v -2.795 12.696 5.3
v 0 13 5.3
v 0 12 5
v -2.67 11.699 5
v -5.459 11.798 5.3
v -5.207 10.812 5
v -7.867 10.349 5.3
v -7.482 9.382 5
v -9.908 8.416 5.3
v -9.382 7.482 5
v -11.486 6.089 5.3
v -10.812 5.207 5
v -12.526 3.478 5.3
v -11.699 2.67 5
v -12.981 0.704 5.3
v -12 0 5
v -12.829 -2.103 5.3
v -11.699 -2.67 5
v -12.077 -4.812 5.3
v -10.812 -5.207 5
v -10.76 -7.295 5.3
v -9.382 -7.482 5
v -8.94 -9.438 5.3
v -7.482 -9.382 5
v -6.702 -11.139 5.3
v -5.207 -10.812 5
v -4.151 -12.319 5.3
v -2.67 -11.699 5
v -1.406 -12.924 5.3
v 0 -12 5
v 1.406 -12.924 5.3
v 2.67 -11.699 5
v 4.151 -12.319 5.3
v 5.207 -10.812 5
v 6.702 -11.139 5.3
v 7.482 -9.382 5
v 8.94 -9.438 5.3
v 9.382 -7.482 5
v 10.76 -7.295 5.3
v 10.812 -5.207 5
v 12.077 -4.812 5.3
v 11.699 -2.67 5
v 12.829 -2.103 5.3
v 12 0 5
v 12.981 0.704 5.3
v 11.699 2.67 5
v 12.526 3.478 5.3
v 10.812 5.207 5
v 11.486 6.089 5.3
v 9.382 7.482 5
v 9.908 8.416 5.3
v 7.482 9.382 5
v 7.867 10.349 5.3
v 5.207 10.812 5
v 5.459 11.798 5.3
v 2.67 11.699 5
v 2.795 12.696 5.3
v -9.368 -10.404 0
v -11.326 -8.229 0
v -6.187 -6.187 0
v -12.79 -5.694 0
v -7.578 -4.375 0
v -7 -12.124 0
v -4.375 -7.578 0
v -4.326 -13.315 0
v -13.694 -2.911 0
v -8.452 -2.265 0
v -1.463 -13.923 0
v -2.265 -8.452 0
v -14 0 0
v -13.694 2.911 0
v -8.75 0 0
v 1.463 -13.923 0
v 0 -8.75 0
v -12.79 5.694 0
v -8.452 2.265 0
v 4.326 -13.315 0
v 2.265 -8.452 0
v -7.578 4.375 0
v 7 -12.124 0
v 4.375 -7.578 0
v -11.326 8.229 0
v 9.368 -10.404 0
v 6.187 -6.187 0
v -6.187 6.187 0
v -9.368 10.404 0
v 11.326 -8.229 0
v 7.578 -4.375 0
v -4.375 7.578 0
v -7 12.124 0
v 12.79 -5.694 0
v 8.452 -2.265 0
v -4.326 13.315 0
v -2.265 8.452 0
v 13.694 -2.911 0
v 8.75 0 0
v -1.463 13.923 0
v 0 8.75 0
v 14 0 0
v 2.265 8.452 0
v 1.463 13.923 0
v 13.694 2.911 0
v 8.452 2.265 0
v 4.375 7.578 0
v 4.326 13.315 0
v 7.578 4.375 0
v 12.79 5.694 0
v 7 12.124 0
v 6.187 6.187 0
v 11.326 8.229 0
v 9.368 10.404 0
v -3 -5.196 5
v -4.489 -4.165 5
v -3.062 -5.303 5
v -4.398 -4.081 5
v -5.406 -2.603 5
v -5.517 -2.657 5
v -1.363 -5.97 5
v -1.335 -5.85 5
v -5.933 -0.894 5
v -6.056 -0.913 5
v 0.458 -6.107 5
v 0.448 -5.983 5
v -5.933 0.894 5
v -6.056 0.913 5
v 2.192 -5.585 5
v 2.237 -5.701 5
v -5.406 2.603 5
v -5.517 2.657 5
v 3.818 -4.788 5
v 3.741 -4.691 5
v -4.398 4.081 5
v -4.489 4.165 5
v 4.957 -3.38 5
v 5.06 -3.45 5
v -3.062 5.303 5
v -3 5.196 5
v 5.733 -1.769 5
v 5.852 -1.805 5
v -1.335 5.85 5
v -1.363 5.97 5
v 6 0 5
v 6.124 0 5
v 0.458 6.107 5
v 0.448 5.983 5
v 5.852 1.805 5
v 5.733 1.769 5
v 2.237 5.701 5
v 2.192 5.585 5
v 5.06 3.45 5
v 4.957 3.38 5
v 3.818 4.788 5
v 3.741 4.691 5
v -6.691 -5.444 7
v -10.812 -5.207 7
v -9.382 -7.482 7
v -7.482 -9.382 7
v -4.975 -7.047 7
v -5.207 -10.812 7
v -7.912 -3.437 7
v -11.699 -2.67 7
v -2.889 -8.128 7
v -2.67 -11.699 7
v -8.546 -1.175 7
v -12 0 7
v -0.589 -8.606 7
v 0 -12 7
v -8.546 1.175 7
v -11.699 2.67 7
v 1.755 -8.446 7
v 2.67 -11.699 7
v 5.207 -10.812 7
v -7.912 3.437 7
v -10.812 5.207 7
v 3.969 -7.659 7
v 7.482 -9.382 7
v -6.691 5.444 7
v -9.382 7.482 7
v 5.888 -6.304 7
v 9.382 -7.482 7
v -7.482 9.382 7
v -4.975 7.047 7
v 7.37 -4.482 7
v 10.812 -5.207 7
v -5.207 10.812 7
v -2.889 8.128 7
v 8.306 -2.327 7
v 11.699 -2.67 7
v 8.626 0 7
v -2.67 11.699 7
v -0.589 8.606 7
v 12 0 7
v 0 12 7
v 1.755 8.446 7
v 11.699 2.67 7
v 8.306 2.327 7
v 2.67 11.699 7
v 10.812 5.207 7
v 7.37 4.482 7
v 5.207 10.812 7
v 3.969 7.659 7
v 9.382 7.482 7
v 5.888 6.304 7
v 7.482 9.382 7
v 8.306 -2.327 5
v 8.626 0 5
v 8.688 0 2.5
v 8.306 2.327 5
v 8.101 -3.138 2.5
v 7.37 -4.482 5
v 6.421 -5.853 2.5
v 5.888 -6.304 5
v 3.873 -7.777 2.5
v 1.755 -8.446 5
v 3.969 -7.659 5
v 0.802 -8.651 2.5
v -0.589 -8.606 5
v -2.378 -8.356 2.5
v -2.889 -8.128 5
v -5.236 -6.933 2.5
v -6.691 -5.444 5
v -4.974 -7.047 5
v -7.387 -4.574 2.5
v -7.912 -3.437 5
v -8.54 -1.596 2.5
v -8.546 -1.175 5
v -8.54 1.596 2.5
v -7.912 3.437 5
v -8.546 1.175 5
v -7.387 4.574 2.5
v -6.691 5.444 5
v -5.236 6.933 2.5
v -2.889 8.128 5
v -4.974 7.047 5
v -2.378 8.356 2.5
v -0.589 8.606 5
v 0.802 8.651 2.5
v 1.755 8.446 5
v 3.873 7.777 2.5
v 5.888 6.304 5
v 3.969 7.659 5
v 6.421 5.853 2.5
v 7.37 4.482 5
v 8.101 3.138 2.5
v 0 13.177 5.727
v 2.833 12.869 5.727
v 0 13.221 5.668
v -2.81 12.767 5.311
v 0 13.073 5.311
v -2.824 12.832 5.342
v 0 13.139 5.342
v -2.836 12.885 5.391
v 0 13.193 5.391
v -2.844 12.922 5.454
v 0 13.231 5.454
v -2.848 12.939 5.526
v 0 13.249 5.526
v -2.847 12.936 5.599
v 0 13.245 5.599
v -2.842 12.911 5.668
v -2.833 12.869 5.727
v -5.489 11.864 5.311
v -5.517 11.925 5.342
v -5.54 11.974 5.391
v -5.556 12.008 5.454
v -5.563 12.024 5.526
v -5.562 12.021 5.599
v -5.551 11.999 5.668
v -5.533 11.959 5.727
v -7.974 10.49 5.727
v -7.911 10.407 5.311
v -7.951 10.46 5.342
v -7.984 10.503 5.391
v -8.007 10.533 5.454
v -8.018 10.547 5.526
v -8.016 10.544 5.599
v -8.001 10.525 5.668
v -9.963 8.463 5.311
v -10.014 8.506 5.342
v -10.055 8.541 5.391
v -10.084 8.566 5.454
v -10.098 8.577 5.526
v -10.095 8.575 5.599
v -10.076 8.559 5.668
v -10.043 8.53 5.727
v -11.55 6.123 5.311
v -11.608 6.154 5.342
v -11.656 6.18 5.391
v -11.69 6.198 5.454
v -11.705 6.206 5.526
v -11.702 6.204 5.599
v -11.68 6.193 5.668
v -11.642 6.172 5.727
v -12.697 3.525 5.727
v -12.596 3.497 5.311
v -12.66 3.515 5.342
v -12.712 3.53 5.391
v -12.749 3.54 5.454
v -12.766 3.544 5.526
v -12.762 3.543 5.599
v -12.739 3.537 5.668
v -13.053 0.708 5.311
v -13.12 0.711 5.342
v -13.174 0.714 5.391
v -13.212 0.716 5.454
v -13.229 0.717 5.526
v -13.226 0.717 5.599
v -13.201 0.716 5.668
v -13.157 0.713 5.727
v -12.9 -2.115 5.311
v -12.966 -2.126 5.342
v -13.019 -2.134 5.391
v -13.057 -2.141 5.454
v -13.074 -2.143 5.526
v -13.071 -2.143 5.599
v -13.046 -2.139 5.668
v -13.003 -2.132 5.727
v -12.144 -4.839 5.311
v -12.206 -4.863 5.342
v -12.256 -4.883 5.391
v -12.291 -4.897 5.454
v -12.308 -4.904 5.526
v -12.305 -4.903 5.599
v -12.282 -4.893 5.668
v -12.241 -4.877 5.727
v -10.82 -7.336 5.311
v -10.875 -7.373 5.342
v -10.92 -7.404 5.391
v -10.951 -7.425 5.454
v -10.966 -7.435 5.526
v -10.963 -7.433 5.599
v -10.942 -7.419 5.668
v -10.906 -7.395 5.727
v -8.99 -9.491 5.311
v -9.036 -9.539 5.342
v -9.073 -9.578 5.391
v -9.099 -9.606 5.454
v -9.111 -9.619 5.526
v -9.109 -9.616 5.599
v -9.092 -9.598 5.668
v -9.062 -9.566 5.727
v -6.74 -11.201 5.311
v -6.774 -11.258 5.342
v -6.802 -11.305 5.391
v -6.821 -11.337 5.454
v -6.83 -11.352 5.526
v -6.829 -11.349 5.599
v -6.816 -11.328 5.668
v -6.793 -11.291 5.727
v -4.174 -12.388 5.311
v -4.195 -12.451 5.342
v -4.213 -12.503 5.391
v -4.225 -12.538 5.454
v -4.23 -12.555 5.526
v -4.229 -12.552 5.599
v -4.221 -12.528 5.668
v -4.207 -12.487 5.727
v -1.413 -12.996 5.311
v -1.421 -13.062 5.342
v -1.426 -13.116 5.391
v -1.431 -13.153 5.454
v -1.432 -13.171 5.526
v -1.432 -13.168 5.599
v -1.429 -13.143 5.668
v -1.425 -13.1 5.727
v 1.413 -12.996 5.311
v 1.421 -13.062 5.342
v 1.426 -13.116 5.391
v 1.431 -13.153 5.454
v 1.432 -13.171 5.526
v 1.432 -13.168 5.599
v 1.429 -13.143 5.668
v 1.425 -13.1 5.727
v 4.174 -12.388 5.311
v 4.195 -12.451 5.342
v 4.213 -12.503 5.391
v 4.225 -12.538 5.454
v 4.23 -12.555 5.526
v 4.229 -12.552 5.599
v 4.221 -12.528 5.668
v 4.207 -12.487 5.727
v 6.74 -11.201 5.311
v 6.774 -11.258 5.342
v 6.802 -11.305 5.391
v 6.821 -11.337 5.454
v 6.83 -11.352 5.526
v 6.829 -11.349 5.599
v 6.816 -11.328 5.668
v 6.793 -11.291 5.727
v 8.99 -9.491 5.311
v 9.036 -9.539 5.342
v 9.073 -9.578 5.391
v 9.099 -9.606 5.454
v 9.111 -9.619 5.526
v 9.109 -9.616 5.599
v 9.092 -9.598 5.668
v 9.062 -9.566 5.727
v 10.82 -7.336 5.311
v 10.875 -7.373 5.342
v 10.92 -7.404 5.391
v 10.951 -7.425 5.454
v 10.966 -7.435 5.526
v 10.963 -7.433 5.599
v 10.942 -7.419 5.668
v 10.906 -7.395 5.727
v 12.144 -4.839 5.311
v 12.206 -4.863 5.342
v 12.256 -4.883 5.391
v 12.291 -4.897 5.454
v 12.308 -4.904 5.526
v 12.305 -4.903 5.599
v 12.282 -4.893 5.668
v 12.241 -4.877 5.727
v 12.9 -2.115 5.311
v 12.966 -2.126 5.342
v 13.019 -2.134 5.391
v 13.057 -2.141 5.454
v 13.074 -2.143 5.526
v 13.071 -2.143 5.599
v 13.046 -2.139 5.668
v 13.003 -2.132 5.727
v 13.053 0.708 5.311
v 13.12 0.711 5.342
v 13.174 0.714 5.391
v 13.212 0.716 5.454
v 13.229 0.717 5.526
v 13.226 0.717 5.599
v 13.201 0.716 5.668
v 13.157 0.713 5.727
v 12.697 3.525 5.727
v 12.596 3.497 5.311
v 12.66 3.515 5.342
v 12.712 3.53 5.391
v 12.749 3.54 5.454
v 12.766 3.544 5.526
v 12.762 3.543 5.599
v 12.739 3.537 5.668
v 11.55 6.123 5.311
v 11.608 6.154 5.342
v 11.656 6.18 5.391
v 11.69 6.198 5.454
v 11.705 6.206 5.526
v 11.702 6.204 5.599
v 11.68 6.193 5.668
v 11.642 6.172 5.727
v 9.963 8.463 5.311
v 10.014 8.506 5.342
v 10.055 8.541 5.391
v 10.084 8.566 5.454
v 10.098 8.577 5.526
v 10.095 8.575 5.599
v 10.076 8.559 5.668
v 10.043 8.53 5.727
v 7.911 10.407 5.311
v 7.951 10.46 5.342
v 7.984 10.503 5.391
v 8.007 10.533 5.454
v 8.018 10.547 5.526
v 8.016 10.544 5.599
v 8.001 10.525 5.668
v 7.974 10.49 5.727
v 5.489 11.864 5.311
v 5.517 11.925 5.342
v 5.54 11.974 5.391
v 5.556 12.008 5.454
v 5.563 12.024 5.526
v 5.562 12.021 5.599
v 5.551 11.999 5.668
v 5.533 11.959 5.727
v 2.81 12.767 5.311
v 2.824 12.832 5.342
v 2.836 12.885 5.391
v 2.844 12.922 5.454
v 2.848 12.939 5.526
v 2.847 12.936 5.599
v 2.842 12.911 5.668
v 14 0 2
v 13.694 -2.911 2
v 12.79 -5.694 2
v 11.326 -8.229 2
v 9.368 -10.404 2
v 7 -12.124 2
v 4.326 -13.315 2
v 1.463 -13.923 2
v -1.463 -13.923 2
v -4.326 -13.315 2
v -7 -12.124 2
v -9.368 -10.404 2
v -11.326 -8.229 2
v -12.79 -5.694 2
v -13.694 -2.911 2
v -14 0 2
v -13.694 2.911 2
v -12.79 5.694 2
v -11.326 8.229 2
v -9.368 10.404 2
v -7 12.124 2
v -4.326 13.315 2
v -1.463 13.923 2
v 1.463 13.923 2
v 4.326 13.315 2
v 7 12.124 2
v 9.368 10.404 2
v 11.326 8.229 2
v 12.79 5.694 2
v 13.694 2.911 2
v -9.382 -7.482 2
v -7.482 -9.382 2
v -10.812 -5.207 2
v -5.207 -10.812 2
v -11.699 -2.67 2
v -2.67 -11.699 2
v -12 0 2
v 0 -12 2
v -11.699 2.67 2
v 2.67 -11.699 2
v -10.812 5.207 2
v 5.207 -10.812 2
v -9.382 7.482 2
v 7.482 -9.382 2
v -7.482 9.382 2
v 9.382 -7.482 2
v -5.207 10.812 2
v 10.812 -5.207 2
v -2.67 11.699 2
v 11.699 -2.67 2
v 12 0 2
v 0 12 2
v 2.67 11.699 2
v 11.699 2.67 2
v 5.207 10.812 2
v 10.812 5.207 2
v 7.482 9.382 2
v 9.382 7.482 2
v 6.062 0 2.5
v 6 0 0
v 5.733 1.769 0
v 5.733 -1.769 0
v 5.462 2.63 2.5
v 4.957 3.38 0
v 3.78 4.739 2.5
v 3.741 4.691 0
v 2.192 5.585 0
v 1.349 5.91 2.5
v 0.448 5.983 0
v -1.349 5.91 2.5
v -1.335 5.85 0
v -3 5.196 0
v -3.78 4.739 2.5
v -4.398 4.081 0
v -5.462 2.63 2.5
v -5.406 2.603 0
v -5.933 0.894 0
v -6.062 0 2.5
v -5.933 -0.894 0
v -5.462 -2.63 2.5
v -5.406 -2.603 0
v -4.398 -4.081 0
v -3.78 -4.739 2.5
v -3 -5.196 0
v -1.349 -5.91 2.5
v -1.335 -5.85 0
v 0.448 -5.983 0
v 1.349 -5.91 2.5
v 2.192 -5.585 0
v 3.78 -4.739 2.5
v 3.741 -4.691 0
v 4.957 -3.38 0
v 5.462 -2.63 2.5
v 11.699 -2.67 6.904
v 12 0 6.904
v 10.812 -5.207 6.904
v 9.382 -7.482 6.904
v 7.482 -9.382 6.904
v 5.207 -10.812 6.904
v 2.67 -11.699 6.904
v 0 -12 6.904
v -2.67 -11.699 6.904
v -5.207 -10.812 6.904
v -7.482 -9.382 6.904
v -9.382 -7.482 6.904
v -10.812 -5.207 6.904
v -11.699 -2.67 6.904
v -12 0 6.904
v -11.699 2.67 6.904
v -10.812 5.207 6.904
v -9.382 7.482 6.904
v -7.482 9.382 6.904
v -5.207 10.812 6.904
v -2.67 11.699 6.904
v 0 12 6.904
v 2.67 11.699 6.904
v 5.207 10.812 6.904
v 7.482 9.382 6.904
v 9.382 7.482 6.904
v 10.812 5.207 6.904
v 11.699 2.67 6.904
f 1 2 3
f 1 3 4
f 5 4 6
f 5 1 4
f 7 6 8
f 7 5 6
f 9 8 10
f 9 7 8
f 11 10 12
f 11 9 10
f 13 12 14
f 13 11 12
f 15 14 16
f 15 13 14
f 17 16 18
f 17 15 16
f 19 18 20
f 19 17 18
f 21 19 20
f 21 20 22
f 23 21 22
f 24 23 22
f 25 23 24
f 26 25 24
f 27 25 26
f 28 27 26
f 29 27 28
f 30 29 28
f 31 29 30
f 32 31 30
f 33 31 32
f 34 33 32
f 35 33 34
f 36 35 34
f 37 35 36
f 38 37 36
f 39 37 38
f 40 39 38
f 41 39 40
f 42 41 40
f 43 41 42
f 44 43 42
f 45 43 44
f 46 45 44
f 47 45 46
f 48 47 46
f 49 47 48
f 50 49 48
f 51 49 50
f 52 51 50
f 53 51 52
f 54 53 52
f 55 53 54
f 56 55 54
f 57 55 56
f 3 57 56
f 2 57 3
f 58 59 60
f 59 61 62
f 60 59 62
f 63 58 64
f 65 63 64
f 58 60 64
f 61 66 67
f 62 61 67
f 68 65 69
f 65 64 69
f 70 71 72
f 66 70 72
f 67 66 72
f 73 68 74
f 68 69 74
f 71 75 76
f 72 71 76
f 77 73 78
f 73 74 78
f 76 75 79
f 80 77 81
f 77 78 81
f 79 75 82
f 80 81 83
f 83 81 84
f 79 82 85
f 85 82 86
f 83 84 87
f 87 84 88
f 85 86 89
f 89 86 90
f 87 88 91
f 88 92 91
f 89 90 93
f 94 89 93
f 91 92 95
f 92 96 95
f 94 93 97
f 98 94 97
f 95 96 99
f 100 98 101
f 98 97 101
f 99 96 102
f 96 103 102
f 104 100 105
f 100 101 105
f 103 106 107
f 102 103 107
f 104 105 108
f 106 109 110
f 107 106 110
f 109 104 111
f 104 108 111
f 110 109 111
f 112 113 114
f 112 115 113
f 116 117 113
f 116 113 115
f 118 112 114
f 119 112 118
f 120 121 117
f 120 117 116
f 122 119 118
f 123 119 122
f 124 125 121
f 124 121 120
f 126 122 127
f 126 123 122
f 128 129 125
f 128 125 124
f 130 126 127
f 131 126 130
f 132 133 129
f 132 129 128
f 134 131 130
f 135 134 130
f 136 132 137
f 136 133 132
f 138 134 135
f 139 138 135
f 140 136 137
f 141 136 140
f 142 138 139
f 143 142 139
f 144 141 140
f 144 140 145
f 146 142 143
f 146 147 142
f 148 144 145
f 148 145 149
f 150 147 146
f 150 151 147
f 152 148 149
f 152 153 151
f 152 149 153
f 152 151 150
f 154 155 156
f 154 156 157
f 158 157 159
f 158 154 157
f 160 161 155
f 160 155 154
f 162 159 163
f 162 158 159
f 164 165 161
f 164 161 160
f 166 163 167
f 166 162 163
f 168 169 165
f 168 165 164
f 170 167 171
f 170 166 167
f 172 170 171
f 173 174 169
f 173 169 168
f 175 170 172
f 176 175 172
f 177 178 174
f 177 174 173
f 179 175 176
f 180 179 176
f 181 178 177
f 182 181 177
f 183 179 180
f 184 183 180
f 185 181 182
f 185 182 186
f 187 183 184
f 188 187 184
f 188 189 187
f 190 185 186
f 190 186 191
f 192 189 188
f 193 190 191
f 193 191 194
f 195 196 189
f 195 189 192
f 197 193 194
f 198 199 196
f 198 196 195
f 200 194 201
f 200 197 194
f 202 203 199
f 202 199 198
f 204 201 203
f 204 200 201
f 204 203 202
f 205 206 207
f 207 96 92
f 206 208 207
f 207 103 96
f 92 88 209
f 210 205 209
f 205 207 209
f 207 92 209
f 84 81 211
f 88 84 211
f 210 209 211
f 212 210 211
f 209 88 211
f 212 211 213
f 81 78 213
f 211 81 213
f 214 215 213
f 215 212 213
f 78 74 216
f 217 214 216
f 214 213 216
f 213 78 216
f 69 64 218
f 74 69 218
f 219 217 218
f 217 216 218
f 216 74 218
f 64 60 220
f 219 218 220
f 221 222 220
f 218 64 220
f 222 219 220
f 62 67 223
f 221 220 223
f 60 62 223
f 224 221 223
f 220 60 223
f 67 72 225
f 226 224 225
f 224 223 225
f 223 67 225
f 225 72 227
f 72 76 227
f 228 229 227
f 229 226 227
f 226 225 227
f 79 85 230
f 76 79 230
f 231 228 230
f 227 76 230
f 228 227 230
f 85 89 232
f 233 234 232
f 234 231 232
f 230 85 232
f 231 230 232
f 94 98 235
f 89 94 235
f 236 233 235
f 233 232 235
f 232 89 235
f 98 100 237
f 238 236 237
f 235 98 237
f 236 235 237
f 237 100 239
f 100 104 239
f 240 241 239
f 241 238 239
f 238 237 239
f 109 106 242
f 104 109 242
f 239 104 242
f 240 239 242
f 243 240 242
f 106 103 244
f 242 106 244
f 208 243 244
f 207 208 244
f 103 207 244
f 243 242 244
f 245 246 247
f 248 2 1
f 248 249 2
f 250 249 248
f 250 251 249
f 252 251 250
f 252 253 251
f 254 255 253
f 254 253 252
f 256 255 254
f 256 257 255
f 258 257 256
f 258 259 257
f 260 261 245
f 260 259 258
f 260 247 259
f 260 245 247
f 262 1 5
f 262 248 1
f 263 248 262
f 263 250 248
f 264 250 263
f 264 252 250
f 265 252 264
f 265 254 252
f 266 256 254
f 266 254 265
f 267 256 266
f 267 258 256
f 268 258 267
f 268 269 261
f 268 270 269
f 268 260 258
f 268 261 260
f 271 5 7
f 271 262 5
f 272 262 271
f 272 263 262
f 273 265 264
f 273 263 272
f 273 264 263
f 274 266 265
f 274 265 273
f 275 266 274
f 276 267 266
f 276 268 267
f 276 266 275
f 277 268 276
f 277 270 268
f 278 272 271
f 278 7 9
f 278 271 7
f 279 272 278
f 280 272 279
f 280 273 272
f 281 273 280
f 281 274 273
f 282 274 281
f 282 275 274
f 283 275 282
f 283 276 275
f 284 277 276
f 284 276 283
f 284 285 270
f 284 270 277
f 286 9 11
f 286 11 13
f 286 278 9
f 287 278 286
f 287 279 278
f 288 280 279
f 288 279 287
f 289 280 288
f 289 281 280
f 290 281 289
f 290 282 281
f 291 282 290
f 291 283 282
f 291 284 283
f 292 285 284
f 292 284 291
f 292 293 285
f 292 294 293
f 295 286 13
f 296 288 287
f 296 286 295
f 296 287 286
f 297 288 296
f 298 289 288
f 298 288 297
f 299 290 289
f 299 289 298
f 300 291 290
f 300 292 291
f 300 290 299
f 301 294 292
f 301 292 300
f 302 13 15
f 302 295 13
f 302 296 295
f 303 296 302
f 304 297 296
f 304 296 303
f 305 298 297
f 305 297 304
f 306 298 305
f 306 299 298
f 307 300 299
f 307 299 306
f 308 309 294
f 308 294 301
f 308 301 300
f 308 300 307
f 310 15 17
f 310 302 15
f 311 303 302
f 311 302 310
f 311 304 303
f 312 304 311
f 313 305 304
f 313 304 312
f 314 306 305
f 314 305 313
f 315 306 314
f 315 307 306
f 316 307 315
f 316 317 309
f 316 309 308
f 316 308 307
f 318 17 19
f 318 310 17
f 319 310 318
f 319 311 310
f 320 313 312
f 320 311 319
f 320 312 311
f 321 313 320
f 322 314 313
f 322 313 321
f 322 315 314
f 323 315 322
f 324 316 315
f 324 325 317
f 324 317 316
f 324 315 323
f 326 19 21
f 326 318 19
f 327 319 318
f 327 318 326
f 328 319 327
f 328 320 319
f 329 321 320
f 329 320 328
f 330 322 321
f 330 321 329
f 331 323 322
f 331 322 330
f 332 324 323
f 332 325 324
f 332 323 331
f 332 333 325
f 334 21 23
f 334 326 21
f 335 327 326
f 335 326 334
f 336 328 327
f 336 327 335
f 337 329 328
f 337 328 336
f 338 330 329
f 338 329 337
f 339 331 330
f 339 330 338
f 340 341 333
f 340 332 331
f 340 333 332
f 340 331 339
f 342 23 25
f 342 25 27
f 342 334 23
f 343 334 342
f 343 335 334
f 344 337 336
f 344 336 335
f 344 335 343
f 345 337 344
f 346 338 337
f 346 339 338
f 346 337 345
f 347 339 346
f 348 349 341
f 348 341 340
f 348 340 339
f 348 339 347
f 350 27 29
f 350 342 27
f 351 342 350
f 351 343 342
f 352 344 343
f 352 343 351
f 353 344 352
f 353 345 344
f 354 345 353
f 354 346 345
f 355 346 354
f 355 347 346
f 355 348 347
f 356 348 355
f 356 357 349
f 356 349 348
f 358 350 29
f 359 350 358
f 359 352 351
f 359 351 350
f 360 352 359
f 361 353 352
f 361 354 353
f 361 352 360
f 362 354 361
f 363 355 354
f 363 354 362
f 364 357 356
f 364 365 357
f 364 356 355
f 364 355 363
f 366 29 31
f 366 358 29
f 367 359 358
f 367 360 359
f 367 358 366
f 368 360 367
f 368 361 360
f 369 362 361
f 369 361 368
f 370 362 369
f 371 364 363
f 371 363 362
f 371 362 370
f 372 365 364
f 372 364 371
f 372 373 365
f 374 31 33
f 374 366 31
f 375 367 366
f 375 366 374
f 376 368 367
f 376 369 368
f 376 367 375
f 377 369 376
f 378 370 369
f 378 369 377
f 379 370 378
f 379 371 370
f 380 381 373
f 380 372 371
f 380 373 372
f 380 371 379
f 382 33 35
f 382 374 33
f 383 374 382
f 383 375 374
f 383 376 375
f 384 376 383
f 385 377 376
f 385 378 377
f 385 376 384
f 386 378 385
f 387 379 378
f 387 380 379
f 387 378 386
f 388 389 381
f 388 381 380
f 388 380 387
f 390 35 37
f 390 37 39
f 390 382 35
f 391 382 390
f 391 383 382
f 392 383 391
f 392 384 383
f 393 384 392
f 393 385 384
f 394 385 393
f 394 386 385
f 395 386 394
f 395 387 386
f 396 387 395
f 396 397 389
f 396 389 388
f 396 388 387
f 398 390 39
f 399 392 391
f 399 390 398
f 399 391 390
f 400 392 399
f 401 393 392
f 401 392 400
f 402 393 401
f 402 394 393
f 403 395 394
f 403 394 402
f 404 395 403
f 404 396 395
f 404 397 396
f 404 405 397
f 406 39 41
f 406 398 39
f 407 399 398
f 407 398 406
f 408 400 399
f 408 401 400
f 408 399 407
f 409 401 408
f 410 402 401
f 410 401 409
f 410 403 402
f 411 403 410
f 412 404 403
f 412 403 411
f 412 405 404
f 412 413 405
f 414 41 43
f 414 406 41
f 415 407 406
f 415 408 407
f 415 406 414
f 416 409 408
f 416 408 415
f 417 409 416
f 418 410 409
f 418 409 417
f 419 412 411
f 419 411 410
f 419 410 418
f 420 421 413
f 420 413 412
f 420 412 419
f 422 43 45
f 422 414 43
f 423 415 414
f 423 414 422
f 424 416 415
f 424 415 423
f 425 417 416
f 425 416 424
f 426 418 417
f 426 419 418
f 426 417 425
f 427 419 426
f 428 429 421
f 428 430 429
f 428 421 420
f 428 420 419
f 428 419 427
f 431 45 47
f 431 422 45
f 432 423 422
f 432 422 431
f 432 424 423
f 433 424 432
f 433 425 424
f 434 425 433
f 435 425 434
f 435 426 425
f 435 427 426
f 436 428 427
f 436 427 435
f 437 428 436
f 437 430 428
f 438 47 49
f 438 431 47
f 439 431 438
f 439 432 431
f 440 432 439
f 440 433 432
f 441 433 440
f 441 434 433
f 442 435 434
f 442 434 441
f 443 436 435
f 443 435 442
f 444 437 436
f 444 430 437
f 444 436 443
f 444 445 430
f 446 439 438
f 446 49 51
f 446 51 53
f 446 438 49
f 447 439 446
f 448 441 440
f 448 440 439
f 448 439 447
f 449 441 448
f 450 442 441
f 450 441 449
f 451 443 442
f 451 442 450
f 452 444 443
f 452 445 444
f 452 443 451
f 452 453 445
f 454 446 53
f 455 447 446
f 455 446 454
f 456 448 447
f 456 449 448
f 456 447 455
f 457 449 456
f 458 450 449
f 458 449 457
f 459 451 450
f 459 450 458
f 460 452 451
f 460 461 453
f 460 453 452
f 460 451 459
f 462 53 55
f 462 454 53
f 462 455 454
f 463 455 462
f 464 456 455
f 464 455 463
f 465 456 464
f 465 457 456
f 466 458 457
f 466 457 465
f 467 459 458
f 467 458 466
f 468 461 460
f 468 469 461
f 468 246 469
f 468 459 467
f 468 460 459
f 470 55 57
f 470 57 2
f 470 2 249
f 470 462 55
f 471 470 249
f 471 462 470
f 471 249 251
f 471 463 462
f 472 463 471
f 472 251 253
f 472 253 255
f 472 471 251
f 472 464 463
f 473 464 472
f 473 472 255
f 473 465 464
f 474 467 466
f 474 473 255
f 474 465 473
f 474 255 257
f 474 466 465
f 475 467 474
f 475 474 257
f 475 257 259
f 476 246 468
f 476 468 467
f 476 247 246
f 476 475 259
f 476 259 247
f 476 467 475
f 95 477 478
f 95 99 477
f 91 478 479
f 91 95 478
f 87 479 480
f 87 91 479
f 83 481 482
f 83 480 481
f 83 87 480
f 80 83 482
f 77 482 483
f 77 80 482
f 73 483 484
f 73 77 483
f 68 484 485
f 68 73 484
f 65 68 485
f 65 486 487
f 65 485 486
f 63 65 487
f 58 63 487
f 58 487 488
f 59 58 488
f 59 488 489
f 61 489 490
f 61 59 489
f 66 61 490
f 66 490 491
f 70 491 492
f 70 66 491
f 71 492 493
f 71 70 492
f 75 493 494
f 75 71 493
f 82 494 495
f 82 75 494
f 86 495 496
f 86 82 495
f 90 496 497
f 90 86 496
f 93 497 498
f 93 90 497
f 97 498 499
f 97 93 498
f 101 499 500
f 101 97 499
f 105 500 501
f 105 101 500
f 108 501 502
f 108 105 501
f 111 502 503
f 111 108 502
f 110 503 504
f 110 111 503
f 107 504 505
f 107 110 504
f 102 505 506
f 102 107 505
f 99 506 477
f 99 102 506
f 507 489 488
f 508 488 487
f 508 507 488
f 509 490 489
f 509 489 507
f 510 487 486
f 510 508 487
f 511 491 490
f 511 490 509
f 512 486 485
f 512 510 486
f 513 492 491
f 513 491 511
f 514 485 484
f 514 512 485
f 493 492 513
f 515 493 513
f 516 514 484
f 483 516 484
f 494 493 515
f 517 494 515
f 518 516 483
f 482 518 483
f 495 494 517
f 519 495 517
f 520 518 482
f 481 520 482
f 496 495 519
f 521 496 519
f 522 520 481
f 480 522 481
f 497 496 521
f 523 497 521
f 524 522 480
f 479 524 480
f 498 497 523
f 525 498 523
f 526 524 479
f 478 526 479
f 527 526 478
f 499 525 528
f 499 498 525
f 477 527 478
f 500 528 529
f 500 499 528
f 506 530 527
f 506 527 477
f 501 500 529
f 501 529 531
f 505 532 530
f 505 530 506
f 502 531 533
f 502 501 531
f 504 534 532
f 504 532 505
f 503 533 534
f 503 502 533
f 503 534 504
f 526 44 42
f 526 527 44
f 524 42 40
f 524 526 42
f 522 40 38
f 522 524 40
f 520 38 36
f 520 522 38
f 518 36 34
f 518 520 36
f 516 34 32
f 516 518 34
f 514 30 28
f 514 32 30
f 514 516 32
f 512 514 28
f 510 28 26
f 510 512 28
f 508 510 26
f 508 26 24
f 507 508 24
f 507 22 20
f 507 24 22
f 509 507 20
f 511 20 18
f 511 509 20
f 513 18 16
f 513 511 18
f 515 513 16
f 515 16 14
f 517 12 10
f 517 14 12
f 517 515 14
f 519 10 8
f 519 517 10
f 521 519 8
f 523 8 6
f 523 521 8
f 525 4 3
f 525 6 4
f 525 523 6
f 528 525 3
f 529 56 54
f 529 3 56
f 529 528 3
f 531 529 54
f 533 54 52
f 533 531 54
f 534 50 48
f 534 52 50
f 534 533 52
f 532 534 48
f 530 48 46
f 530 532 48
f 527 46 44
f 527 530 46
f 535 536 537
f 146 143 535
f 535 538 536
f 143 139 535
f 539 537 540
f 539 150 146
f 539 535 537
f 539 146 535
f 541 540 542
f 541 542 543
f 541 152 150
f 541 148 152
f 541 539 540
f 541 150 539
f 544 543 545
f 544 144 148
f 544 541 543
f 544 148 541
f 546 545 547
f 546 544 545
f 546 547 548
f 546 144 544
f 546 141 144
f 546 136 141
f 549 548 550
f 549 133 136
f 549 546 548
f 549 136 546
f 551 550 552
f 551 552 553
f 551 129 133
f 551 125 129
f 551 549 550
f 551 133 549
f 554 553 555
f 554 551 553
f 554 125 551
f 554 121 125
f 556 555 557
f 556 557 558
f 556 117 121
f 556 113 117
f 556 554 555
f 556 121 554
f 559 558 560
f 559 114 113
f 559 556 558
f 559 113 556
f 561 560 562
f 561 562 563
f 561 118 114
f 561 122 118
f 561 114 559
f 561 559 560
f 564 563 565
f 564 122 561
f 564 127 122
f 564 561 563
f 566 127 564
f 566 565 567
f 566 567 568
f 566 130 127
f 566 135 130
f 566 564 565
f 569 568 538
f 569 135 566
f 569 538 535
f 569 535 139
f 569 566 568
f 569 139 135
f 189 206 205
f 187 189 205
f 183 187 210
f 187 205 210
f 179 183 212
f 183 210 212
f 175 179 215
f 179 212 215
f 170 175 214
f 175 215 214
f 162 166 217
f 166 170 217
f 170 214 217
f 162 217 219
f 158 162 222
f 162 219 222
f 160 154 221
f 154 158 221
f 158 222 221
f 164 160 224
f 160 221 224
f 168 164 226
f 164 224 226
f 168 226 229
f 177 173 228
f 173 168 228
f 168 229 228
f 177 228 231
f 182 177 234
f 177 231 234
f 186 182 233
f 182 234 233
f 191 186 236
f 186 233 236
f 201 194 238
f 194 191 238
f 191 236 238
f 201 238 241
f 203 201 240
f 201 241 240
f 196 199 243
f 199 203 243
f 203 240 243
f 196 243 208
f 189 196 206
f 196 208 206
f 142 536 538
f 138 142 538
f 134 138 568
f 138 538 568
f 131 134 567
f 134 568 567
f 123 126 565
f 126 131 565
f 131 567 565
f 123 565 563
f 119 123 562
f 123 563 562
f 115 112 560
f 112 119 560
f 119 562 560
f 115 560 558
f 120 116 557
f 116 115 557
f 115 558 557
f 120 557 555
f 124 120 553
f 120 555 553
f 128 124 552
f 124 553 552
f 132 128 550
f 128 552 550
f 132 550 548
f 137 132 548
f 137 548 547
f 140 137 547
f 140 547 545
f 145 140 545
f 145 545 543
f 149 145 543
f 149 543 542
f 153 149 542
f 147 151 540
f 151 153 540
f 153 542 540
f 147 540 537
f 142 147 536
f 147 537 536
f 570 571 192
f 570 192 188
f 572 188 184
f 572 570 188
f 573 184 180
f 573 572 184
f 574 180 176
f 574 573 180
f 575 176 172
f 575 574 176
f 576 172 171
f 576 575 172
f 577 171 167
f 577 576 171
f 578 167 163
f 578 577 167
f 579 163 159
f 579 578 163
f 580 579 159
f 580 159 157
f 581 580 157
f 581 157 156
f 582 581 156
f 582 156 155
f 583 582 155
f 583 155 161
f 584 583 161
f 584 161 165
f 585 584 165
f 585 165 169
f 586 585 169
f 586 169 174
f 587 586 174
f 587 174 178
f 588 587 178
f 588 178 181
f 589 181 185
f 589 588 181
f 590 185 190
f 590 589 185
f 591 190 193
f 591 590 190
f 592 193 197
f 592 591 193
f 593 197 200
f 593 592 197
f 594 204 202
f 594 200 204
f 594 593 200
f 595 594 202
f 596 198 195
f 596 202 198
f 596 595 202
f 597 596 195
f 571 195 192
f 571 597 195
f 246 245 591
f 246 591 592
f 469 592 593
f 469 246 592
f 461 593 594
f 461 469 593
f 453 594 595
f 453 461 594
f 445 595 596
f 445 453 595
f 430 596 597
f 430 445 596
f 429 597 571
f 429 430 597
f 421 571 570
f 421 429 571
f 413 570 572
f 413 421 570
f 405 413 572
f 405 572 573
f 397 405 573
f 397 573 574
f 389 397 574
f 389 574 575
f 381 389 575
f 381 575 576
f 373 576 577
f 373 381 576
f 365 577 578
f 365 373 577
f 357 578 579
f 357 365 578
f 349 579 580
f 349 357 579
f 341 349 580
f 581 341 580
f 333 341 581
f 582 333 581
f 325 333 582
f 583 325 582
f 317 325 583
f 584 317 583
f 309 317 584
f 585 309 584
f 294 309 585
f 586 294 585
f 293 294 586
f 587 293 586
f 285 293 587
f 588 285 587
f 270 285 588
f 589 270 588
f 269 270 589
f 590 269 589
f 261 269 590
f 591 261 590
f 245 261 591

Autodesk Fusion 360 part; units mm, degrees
sketch "Sketch1" plane through (0, 0, 0) normal (0, 0, 1) x (1, 0, 0)
  circle A0 centre (0, 0) radius 8.75
  circle A1 centre (0, 0) radius 12
  circle A2 centre (0, 0) radius 14
  circle A3 centre (0, 0) radius 6
  circle A4 centre (0, 0) radius 2.5
  dimension "d1" = 17.5
  dimension "d2" = 24
  dimension "d3" = 28
  dimension "d8" = 12
  dimension "d11" = 5
extrude "Extrude1" add sketch "Sketch1" along normal blind 2 contours A2
extrude "Extrude2" add sketch "Sketch1" along normal blind 5 contours A0 | A1
extrude "Extrude3" cut sketch "Sketch1" along normal blind 5 draft -1.42 contours A0 | A3
sketch "Sketch2" plane through (0, 0, 5) normal (0, 0, 1) x (1, 0, 0)
  circle A0 centre (0, 0) radius 8.6261
  circle A1 centre (0, 0) radius 12
  circle A2 centre (0, 0) radius 8.6261
  circle A3 centre (0, 0) radius 12
  circle A4 centre (0, 0) radius 14
  dimension "d12" = 28
extrude "Extrude4" add sketch "Sketch2" along normal blind 2 contours A1 A3
sketch "Sketch3" plane through (0, 0, 0) normal (1, 0, 0) x (0, 0, -1)
  line L0 (-5.3, 12) -> (-5.3, 13)
  line L1 (-5.7268, 13.1768) -> (-6.9036, 12)
  line L2 (-6.9036, 12) -> (-5.3, 12)
  arc A0 (-5.3, 13) -> (-5.7268, 13.1768) centre (-5.55, 13) ccw
  line L3 (-7, 12) -> (-7, -12)
  line L4 (-2, -12) -> (-2, 12)
  line L5 (-5.3, 13) -> (-5, 12)
  line L6 (-5, 12) -> (-5.3, 12)
  dimension "d15" = 0.25
  dimension "d17" = 1
  dimension "d18" = 1.7
revolve "Revolve1" add sketch "Sketch3" angle 360 about axis through (0, 0, 1.75) along (0, 0, 1)
